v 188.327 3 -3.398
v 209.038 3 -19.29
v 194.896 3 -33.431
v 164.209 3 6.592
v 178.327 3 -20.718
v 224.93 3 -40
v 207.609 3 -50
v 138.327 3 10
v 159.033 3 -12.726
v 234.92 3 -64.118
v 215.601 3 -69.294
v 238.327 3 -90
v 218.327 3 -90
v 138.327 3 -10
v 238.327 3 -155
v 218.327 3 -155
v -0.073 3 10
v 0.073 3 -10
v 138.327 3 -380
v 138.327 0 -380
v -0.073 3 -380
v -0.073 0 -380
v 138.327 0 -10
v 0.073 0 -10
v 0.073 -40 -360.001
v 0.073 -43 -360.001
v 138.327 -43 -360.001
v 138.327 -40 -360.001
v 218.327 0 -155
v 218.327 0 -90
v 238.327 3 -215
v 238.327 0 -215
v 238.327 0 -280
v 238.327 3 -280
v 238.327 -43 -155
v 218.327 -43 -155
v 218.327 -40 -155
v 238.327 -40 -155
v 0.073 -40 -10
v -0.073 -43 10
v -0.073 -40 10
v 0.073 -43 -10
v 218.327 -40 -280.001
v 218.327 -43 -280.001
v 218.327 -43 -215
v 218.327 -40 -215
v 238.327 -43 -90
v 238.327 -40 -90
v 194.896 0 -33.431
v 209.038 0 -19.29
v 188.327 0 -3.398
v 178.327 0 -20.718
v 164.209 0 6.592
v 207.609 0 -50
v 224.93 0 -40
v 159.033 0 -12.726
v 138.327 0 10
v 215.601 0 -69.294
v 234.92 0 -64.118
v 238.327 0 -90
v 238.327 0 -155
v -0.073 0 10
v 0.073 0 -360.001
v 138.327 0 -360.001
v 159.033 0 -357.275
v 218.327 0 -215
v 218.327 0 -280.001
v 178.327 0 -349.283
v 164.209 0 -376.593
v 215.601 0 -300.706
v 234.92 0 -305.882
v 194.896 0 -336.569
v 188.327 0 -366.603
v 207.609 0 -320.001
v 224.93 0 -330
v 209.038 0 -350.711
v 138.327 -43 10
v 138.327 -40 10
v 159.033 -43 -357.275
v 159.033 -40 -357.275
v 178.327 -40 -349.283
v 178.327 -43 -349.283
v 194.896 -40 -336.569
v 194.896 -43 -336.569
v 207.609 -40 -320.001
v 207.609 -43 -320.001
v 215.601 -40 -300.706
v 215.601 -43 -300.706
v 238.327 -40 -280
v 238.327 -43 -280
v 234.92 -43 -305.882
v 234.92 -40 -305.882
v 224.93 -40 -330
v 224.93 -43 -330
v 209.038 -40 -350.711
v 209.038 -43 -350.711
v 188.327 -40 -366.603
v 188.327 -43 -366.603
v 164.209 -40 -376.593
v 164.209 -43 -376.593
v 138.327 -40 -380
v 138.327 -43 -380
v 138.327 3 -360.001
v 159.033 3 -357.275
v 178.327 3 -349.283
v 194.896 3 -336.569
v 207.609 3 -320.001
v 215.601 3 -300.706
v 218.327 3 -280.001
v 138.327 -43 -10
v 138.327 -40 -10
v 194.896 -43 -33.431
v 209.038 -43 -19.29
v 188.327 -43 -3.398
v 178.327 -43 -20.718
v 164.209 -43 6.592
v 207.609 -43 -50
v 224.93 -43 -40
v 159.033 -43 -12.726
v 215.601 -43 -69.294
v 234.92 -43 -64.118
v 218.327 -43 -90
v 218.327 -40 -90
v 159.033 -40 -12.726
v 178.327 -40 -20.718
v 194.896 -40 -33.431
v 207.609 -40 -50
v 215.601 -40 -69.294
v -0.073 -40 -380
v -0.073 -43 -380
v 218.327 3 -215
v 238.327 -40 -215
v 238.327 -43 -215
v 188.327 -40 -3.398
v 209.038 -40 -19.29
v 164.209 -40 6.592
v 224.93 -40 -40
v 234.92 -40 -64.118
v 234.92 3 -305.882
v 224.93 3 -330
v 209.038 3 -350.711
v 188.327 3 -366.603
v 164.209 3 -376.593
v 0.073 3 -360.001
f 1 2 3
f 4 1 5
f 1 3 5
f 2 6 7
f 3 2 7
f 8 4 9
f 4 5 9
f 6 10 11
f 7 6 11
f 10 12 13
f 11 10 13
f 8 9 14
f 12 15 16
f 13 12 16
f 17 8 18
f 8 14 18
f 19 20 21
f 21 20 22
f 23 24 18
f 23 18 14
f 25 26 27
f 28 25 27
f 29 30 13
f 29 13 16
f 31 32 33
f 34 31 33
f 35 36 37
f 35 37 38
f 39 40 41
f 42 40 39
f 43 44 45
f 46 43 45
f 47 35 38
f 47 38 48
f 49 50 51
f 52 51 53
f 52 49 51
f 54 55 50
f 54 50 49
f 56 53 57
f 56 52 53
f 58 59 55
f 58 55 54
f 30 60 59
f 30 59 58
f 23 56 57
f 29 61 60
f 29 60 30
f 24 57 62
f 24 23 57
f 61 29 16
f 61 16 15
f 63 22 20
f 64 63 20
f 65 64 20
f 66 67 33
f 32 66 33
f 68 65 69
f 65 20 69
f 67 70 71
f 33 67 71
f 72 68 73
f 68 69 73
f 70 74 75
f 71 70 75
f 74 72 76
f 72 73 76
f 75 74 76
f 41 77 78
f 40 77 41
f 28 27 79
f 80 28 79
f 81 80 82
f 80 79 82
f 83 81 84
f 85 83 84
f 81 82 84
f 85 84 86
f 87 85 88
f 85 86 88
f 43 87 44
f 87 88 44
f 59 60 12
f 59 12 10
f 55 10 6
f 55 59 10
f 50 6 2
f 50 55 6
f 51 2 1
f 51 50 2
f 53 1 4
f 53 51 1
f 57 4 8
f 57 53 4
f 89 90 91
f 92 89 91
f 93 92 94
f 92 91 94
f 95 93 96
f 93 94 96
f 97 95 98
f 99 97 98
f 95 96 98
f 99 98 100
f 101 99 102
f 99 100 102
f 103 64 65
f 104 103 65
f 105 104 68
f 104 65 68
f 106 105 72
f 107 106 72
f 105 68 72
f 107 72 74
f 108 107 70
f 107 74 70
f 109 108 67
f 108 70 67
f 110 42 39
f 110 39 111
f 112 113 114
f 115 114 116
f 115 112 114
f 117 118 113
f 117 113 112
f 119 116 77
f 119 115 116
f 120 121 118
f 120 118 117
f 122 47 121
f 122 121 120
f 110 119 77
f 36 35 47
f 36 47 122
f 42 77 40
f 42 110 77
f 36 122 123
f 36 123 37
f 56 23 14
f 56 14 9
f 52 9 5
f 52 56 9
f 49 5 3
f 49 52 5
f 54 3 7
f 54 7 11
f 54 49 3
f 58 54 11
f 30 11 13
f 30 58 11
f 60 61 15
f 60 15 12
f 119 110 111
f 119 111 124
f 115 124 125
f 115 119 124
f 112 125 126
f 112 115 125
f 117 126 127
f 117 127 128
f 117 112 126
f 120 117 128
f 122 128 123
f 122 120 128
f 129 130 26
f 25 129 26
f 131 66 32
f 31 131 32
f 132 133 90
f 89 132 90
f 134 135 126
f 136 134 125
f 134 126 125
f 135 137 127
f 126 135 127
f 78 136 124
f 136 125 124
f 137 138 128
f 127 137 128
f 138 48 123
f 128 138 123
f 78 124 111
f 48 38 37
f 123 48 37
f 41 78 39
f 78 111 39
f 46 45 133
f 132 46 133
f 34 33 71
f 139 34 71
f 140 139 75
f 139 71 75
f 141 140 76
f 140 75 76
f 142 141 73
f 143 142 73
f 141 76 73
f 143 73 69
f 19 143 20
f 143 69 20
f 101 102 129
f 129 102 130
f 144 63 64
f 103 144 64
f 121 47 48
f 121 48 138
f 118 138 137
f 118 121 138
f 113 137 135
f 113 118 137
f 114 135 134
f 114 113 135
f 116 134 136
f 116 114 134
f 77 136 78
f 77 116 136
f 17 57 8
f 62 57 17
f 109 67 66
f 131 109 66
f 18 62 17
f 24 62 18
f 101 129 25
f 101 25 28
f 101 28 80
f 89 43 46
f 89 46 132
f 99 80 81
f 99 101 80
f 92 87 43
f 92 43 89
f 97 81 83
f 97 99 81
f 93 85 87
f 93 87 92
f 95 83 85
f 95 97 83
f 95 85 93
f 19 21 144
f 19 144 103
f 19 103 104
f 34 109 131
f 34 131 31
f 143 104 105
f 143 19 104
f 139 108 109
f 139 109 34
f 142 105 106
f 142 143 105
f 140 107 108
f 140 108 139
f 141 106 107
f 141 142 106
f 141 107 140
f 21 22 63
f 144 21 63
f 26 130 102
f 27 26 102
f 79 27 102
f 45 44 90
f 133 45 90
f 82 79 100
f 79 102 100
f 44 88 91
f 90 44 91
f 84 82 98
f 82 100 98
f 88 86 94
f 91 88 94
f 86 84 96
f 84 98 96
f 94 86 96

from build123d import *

# Parameters (mm, degrees)
BOSS_EXTRUDE1_DEPTH   = 3
BOSS_EXTRUDE1_2_DEPTH = 3
LPATTERN2_COUNT       = 2
LPATTERN2_PITCH       = 43


with BuildPart() as part:
    # Sketch1 → Boss-Extrude1 (new body)
    with BuildSketch(Plane(origin=(0, 0, 0), x_dir=(1, 0, 0), z_dir=(0, 1, 0))):
        with BuildLine():
            Line((0.072614511, 9.999736353), (100.072614511, 9.999736353))
            Line((100.072614511, 9.999736353), (138.327385489, 9.999736353))
            ThreePointArc((138.327385489, 9.999736353), (194.895927984, 33.431193858), (218.327385489, 89.999736353))
            Line((218.327385489, 89.999736353), (218.327385489, 95.000263647))
            Line((218.327385489, 95.000263647), (218.327385489, 155.000263647))
            Line((218.327385489, 155.000263647), (238.327385489, 155.000263647))
            Line((238.327385489, 155.000263647), (238.327385489, 95.000263647))
            Line((238.327385489, 95.000263647), (238.327385489, 90.000263647))
            ThreePointArc((238.327385489, 90.000263647), (209.038063608, 19.289585528), (138.327385489, -9.999736353))
            Line((138.327385489, -9.999736353), (99.927385489, -9.999736353))
            Line((99.927385489, -9.999736353), (-0.072614511, -9.999736353))
            Line((-0.072614511, -9.999736353), (0.072614511, 9.999736353))
        make_face()
    boss_extrude1 = extrude(amount=BOSS_EXTRUDE1_DEPTH)


with BuildPart() as body_2:
    # Sketch1 → Boss-Extrude1 2 (new body)
    with BuildSketch(Plane(origin=(0, 0, 0), x_dir=(1, 0, 0), z_dir=(0, 1, 0))):
        with BuildLine():
            Line((138.327385489, 380.000263647), (99.927385489, 380.000263647))
            Line((99.927385489, 380.000263647), (-0.072614511, 380.000263647))
            Line((-0.072614511, 380.000263647), (0.072614511, 360.00079094))
            Line((0.072614511, 360.00079094), (100.072614511, 360.00079094))
            Line((100.072614511, 360.00079094), (138.327385489, 360.00079094))
            ThreePointArc((138.327385489, 360.00079094), (194.895927984, 336.569333435), (218.327385489, 280.00079094))
            Line((218.327385489, 280.00079094), (218.327385489, 275.000263647))
            Line((218.327385489, 275.000263647), (218.327385489, 215.000263647))
            Line((218.327385489, 215.000263647), (238.327385489, 215.000263647))
            Line((238.327385489, 215.000263647), (238.327385489, 275.000263647))
            Line((238.327385489, 275.000263647), (238.327385489, 280.000263647))
            ThreePointArc((238.327385489, 280.000263647), (209.038063608, 350.710941765), (138.327385489, 380.000263647))
        make_face()
    boss_extrude1_2 = extrude(amount=BOSS_EXTRUDE1_2_DEPTH)


with BuildPart() as lpattern2_1:
    # LPattern2: Boss-Extrude1, Boss-Extrude1 2 ×2
    with Locations(*[(0, -i * LPATTERN2_PITCH, 0) for i in range(1, LPATTERN2_COUNT)]):
        add(boss_extrude1)
        add(boss_extrude1_2)


solid = Compound([part.part, body_2.part, lpattern2_1.part])
